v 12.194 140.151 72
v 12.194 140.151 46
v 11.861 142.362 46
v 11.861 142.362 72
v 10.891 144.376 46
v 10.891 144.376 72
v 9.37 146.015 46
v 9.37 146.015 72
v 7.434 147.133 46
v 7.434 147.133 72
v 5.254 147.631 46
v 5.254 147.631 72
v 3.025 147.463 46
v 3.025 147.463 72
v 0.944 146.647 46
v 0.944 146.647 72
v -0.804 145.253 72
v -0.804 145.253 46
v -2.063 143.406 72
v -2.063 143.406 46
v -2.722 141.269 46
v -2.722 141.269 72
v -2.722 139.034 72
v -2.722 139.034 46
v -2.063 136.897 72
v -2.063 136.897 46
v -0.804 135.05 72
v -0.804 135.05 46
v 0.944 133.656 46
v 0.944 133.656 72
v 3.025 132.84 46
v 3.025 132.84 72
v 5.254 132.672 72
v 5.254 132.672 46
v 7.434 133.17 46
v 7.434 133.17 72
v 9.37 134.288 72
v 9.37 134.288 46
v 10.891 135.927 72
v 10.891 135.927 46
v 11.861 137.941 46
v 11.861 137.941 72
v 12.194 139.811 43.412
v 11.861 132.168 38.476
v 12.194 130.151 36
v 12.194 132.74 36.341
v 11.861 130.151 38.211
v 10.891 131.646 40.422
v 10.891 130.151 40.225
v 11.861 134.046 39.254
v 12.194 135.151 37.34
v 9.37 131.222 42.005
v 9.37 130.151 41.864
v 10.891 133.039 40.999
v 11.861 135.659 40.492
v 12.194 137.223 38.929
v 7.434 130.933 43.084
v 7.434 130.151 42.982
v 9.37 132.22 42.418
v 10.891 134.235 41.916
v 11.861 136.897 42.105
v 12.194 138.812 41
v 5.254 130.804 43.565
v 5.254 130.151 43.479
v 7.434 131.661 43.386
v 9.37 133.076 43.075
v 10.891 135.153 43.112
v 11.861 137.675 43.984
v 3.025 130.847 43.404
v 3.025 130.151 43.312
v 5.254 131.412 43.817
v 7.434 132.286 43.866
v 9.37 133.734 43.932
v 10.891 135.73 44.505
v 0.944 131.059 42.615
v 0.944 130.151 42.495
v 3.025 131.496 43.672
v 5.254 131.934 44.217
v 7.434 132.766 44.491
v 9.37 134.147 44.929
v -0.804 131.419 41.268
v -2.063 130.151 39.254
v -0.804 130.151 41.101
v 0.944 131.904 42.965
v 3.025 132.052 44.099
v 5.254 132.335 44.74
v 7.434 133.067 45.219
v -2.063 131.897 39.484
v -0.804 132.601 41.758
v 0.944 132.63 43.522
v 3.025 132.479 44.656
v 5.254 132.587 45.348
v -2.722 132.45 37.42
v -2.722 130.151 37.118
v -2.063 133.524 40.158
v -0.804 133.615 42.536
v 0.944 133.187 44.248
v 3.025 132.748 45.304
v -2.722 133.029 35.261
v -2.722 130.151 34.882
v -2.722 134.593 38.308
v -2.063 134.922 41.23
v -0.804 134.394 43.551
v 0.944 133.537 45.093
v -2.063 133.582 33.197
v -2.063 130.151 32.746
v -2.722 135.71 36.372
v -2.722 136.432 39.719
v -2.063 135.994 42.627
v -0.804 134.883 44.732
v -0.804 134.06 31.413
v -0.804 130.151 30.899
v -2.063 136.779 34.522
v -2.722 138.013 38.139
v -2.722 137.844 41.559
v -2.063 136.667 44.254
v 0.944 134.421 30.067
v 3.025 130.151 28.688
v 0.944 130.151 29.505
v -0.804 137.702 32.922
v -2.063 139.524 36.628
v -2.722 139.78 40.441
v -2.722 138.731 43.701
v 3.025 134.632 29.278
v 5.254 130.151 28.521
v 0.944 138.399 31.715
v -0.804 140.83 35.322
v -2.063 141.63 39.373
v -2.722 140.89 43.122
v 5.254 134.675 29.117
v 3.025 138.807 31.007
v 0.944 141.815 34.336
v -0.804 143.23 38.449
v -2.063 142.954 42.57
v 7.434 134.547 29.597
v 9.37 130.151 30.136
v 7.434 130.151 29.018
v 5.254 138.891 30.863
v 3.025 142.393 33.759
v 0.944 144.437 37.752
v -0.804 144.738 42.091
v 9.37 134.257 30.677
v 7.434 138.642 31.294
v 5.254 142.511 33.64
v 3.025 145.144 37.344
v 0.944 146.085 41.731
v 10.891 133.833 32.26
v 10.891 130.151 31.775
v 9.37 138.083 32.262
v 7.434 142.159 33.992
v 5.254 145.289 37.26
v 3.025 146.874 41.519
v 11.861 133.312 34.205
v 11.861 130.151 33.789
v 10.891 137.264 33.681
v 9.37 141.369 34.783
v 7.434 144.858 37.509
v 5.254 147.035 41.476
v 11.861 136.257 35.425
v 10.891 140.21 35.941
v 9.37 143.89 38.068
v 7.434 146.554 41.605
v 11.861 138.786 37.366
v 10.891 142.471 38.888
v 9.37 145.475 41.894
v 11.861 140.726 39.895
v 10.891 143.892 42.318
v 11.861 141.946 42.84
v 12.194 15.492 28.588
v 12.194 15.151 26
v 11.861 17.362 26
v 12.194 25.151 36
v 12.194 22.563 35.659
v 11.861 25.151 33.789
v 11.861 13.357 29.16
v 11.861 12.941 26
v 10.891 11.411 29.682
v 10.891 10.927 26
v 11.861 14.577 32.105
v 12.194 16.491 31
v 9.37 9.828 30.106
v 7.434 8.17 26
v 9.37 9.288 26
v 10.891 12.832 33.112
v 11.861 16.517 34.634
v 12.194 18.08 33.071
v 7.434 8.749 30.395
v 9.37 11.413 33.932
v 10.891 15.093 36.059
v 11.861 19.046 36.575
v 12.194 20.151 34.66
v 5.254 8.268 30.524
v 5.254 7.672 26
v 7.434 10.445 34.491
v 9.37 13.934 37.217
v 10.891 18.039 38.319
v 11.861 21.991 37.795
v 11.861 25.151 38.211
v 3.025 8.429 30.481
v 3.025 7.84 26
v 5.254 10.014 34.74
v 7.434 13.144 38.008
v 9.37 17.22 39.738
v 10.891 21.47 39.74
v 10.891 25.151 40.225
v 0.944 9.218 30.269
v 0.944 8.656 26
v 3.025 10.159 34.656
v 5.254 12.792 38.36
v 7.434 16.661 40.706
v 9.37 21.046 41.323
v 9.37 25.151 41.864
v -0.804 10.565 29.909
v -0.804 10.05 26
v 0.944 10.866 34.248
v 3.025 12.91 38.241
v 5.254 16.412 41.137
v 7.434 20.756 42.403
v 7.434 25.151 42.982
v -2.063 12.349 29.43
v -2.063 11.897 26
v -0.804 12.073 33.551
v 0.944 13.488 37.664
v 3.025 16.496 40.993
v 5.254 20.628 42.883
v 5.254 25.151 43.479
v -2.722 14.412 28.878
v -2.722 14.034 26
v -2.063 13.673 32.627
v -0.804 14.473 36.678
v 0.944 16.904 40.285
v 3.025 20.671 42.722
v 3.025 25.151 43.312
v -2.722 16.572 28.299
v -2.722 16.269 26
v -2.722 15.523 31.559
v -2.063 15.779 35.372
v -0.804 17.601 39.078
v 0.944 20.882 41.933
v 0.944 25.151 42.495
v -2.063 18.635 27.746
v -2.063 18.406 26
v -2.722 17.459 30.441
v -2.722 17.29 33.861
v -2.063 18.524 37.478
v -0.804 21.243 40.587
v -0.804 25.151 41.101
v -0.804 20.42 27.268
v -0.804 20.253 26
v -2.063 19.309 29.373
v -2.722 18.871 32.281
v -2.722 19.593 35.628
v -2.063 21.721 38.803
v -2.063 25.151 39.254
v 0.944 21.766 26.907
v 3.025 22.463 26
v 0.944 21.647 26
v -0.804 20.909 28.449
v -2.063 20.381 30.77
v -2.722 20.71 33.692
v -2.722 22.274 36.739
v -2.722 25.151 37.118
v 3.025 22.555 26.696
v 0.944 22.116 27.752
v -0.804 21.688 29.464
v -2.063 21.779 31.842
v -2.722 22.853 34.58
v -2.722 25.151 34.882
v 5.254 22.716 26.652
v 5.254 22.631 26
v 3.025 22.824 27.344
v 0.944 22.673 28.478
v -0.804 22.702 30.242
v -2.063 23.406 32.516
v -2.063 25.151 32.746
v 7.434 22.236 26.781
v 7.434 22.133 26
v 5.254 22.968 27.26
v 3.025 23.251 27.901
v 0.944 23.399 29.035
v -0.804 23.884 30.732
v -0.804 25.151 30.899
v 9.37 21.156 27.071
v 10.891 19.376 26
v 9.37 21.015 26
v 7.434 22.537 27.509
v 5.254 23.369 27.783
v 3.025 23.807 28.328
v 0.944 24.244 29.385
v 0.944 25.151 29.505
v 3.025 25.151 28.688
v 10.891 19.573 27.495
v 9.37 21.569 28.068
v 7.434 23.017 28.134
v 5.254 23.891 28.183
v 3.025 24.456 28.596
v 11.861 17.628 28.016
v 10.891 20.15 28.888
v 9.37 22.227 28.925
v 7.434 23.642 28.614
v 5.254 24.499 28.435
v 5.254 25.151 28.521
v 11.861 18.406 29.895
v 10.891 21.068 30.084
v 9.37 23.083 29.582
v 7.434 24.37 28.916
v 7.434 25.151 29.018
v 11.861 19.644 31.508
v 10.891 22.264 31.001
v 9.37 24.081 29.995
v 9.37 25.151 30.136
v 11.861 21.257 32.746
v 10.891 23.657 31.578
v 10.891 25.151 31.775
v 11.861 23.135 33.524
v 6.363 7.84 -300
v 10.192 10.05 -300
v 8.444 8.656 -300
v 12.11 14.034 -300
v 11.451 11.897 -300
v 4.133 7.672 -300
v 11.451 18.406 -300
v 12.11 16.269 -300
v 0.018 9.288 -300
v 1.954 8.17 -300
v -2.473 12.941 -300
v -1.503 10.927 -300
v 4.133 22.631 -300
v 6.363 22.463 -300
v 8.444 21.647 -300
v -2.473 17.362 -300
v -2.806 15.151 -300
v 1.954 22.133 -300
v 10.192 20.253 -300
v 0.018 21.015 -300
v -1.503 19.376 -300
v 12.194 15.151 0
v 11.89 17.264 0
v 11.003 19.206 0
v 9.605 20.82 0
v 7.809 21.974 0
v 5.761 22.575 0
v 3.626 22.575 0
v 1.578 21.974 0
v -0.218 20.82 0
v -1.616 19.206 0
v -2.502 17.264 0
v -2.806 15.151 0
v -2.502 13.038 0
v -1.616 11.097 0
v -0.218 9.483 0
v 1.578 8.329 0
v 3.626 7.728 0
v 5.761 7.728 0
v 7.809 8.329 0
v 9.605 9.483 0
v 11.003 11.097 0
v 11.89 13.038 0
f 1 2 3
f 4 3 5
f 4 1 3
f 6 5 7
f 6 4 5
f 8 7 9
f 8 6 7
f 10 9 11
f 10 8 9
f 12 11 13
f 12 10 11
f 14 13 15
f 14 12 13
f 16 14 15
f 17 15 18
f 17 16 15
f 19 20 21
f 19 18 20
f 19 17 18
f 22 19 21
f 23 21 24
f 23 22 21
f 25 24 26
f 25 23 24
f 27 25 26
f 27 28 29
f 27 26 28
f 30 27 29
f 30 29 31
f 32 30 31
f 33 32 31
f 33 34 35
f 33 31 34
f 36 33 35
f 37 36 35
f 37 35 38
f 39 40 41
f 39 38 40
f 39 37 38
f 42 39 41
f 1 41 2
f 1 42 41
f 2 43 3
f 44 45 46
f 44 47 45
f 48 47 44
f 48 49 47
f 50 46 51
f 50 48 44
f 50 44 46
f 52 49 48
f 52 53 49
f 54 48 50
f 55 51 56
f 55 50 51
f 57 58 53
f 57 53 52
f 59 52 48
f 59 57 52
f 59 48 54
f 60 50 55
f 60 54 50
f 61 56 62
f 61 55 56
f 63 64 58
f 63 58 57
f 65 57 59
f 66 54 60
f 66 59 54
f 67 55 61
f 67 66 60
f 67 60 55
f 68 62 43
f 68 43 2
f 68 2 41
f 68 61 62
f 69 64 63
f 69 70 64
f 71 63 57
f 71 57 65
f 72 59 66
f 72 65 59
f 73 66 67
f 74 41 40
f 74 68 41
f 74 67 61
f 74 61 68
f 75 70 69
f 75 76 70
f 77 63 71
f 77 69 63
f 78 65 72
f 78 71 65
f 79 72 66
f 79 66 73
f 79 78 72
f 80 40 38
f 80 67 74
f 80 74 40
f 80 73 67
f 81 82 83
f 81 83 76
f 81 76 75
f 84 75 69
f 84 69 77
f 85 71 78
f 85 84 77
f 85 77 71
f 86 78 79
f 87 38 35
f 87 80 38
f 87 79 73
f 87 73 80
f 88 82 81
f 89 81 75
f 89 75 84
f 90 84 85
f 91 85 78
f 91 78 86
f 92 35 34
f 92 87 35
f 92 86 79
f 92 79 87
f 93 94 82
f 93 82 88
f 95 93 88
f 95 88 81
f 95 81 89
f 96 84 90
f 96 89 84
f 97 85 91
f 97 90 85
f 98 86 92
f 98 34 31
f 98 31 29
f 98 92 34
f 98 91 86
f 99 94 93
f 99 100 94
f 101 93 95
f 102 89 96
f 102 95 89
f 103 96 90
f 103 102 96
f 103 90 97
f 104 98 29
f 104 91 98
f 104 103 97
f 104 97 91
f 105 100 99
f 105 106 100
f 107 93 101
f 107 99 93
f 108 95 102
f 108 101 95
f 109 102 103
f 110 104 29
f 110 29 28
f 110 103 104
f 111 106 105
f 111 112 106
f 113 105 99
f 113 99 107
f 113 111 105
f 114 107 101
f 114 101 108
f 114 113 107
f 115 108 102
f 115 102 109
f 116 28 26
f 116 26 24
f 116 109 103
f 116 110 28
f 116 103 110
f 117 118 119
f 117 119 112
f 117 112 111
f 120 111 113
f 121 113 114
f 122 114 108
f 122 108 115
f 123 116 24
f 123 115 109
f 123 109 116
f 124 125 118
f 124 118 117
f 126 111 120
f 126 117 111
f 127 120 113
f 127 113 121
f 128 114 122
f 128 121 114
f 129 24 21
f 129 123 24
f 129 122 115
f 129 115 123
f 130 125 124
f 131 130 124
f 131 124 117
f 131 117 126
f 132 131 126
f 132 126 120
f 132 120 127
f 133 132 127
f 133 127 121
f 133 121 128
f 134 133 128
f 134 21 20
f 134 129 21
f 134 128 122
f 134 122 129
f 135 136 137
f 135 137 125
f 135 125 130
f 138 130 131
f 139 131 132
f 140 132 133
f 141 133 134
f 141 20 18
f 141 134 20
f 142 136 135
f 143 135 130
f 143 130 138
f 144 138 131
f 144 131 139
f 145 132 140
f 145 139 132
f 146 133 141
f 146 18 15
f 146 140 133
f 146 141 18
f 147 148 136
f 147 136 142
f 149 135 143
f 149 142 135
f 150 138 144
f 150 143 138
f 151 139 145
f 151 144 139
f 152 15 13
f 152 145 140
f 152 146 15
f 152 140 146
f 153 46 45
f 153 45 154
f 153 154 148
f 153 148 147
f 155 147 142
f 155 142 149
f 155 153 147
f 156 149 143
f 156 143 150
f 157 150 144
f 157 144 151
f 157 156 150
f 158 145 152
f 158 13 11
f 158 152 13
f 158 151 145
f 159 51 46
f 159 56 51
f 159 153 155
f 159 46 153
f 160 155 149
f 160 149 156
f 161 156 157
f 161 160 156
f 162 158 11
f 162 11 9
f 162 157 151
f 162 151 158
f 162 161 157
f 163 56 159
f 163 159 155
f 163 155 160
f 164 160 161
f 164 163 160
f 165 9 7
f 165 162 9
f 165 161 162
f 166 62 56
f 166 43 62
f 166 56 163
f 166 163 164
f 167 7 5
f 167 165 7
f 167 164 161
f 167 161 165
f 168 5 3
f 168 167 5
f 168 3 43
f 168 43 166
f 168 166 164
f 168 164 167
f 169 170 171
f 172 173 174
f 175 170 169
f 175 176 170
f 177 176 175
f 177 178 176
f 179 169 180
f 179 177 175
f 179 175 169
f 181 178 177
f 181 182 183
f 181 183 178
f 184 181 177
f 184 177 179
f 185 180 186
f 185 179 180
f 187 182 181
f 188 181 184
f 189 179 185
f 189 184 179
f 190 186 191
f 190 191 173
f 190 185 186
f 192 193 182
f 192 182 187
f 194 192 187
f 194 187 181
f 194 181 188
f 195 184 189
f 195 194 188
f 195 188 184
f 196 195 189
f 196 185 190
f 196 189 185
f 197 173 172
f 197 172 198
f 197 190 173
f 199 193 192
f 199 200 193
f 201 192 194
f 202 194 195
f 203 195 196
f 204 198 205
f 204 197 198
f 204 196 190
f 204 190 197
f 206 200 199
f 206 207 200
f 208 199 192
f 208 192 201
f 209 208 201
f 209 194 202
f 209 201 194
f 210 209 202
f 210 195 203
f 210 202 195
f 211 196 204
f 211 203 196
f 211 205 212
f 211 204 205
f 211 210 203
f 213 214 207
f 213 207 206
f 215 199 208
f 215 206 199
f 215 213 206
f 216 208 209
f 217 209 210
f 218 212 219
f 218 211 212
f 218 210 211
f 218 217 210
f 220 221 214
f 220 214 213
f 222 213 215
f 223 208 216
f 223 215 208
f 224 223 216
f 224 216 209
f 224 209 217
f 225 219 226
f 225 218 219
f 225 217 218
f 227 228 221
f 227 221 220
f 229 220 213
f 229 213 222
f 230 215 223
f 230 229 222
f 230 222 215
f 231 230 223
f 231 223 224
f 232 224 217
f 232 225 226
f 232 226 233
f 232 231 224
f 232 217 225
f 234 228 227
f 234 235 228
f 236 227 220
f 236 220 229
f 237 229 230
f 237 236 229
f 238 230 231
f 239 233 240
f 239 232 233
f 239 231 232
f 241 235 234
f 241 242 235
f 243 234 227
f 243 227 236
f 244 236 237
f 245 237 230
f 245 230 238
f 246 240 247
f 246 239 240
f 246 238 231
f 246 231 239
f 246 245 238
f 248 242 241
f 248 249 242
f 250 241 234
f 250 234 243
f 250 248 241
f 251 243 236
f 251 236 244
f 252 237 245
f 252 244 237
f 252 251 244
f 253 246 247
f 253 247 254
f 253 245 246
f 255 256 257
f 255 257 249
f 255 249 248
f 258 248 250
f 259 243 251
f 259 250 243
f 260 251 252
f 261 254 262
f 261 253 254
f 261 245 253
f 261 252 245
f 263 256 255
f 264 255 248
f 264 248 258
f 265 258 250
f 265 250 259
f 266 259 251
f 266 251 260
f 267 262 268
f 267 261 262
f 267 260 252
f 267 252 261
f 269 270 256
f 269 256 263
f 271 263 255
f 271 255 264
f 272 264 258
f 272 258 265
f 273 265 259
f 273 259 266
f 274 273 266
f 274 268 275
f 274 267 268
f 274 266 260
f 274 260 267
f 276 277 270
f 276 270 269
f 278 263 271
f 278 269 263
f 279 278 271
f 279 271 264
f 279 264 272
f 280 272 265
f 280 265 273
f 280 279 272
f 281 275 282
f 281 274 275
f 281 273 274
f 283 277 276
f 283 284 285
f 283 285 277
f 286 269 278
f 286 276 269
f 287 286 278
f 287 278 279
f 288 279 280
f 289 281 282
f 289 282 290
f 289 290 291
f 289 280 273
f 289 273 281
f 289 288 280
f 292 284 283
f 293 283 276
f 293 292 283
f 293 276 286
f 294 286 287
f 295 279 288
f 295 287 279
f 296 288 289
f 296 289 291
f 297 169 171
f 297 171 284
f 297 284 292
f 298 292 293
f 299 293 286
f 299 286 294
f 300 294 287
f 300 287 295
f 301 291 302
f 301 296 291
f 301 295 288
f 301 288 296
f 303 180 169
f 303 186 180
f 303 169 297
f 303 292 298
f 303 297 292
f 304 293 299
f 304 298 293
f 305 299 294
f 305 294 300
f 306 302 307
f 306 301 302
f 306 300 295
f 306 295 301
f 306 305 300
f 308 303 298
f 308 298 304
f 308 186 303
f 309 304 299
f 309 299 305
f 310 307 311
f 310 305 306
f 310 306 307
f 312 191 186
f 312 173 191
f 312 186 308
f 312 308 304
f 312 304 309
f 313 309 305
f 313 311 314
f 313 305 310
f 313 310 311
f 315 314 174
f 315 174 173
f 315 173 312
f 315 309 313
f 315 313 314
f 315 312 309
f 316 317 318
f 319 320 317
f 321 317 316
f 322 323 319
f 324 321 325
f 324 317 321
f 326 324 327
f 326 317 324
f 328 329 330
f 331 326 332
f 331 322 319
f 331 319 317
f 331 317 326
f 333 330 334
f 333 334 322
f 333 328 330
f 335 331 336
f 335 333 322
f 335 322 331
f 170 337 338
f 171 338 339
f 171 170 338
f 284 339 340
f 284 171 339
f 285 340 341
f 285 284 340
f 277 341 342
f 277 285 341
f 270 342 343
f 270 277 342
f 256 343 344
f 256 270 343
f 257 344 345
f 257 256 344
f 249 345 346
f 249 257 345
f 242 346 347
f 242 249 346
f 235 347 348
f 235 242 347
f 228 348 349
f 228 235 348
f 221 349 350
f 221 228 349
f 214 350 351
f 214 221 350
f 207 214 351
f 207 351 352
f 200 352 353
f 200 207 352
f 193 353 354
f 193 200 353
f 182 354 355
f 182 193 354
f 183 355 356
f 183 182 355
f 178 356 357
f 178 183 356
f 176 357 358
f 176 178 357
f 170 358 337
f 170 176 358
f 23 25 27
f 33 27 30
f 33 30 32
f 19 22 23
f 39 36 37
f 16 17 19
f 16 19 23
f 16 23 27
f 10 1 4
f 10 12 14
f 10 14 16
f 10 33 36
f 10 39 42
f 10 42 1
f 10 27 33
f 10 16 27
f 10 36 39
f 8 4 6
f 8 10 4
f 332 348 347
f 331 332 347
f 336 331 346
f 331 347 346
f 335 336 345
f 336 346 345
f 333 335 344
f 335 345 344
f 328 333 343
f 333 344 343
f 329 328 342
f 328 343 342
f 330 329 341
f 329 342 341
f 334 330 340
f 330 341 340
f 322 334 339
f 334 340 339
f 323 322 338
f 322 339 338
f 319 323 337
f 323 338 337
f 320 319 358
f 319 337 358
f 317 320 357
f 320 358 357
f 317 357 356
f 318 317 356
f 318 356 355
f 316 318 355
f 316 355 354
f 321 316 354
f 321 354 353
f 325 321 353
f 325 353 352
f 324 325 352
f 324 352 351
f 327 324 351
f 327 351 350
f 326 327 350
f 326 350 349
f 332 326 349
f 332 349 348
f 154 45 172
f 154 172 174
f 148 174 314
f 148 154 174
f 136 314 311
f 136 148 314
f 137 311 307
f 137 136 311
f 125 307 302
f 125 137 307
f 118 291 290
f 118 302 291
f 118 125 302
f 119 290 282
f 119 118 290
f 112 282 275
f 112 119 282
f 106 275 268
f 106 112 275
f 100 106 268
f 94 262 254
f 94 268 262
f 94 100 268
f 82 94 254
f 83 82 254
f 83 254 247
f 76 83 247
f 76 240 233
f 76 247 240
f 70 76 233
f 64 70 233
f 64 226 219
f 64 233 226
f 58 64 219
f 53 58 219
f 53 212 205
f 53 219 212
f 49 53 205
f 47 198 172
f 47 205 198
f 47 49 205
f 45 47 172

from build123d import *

# Parameters (mm, degrees)
CROQUIS1_R              = 7.5
CROQUIS2_R              = 7.5
SALIENTE_EXTRUIR1_DEPTH = 300


with BuildPart() as part:
    # Barrer1: sweep along a curve in space
    with BuildLine() as barrer1_path:
        Line((4.693833182, 15.151479833, 0), (4.693833182, 15.151479833, 26))
        ThreePointArc((4.693833182, 15.151479833, 26), (4.693833182, 18.080412022, 33.071067812), (4.693833182, 25.151479833, 36))
        Line((4.693833182, 25.151479833, 36), (4.693833182, 130.151479833, 36))
        ThreePointArc((4.693833182, 130.151479833, 36), (4.693833182, 137.222547645, 38.928932188), (4.693833182, 140.151479833, 46))
        Line((4.693833182, 140.151479833, 46), (4.693833182, 140.151479833, 72))
    # Croquis1 → Barrer1 (sweep)
    with BuildSketch(Plane.XY):
        with Locations((4.693833182, 15.151479833)):
            Circle(CROQUIS1_R)
    sweep(path=barrer1_path.line)

    # Croquis2 → Saliente-Extruir1 (add)
    with BuildSketch(Plane(origin=(0, 0, 0), x_dir=(-1, 0, 0), z_dir=(0, 0, -1))):
        with Locations((-4.693833182, 15.151479833)):
            Circle(CROQUIS2_R)
    extrude(amount=SALIENTE_EXTRUIR1_DEPTH)


solid = part.part
